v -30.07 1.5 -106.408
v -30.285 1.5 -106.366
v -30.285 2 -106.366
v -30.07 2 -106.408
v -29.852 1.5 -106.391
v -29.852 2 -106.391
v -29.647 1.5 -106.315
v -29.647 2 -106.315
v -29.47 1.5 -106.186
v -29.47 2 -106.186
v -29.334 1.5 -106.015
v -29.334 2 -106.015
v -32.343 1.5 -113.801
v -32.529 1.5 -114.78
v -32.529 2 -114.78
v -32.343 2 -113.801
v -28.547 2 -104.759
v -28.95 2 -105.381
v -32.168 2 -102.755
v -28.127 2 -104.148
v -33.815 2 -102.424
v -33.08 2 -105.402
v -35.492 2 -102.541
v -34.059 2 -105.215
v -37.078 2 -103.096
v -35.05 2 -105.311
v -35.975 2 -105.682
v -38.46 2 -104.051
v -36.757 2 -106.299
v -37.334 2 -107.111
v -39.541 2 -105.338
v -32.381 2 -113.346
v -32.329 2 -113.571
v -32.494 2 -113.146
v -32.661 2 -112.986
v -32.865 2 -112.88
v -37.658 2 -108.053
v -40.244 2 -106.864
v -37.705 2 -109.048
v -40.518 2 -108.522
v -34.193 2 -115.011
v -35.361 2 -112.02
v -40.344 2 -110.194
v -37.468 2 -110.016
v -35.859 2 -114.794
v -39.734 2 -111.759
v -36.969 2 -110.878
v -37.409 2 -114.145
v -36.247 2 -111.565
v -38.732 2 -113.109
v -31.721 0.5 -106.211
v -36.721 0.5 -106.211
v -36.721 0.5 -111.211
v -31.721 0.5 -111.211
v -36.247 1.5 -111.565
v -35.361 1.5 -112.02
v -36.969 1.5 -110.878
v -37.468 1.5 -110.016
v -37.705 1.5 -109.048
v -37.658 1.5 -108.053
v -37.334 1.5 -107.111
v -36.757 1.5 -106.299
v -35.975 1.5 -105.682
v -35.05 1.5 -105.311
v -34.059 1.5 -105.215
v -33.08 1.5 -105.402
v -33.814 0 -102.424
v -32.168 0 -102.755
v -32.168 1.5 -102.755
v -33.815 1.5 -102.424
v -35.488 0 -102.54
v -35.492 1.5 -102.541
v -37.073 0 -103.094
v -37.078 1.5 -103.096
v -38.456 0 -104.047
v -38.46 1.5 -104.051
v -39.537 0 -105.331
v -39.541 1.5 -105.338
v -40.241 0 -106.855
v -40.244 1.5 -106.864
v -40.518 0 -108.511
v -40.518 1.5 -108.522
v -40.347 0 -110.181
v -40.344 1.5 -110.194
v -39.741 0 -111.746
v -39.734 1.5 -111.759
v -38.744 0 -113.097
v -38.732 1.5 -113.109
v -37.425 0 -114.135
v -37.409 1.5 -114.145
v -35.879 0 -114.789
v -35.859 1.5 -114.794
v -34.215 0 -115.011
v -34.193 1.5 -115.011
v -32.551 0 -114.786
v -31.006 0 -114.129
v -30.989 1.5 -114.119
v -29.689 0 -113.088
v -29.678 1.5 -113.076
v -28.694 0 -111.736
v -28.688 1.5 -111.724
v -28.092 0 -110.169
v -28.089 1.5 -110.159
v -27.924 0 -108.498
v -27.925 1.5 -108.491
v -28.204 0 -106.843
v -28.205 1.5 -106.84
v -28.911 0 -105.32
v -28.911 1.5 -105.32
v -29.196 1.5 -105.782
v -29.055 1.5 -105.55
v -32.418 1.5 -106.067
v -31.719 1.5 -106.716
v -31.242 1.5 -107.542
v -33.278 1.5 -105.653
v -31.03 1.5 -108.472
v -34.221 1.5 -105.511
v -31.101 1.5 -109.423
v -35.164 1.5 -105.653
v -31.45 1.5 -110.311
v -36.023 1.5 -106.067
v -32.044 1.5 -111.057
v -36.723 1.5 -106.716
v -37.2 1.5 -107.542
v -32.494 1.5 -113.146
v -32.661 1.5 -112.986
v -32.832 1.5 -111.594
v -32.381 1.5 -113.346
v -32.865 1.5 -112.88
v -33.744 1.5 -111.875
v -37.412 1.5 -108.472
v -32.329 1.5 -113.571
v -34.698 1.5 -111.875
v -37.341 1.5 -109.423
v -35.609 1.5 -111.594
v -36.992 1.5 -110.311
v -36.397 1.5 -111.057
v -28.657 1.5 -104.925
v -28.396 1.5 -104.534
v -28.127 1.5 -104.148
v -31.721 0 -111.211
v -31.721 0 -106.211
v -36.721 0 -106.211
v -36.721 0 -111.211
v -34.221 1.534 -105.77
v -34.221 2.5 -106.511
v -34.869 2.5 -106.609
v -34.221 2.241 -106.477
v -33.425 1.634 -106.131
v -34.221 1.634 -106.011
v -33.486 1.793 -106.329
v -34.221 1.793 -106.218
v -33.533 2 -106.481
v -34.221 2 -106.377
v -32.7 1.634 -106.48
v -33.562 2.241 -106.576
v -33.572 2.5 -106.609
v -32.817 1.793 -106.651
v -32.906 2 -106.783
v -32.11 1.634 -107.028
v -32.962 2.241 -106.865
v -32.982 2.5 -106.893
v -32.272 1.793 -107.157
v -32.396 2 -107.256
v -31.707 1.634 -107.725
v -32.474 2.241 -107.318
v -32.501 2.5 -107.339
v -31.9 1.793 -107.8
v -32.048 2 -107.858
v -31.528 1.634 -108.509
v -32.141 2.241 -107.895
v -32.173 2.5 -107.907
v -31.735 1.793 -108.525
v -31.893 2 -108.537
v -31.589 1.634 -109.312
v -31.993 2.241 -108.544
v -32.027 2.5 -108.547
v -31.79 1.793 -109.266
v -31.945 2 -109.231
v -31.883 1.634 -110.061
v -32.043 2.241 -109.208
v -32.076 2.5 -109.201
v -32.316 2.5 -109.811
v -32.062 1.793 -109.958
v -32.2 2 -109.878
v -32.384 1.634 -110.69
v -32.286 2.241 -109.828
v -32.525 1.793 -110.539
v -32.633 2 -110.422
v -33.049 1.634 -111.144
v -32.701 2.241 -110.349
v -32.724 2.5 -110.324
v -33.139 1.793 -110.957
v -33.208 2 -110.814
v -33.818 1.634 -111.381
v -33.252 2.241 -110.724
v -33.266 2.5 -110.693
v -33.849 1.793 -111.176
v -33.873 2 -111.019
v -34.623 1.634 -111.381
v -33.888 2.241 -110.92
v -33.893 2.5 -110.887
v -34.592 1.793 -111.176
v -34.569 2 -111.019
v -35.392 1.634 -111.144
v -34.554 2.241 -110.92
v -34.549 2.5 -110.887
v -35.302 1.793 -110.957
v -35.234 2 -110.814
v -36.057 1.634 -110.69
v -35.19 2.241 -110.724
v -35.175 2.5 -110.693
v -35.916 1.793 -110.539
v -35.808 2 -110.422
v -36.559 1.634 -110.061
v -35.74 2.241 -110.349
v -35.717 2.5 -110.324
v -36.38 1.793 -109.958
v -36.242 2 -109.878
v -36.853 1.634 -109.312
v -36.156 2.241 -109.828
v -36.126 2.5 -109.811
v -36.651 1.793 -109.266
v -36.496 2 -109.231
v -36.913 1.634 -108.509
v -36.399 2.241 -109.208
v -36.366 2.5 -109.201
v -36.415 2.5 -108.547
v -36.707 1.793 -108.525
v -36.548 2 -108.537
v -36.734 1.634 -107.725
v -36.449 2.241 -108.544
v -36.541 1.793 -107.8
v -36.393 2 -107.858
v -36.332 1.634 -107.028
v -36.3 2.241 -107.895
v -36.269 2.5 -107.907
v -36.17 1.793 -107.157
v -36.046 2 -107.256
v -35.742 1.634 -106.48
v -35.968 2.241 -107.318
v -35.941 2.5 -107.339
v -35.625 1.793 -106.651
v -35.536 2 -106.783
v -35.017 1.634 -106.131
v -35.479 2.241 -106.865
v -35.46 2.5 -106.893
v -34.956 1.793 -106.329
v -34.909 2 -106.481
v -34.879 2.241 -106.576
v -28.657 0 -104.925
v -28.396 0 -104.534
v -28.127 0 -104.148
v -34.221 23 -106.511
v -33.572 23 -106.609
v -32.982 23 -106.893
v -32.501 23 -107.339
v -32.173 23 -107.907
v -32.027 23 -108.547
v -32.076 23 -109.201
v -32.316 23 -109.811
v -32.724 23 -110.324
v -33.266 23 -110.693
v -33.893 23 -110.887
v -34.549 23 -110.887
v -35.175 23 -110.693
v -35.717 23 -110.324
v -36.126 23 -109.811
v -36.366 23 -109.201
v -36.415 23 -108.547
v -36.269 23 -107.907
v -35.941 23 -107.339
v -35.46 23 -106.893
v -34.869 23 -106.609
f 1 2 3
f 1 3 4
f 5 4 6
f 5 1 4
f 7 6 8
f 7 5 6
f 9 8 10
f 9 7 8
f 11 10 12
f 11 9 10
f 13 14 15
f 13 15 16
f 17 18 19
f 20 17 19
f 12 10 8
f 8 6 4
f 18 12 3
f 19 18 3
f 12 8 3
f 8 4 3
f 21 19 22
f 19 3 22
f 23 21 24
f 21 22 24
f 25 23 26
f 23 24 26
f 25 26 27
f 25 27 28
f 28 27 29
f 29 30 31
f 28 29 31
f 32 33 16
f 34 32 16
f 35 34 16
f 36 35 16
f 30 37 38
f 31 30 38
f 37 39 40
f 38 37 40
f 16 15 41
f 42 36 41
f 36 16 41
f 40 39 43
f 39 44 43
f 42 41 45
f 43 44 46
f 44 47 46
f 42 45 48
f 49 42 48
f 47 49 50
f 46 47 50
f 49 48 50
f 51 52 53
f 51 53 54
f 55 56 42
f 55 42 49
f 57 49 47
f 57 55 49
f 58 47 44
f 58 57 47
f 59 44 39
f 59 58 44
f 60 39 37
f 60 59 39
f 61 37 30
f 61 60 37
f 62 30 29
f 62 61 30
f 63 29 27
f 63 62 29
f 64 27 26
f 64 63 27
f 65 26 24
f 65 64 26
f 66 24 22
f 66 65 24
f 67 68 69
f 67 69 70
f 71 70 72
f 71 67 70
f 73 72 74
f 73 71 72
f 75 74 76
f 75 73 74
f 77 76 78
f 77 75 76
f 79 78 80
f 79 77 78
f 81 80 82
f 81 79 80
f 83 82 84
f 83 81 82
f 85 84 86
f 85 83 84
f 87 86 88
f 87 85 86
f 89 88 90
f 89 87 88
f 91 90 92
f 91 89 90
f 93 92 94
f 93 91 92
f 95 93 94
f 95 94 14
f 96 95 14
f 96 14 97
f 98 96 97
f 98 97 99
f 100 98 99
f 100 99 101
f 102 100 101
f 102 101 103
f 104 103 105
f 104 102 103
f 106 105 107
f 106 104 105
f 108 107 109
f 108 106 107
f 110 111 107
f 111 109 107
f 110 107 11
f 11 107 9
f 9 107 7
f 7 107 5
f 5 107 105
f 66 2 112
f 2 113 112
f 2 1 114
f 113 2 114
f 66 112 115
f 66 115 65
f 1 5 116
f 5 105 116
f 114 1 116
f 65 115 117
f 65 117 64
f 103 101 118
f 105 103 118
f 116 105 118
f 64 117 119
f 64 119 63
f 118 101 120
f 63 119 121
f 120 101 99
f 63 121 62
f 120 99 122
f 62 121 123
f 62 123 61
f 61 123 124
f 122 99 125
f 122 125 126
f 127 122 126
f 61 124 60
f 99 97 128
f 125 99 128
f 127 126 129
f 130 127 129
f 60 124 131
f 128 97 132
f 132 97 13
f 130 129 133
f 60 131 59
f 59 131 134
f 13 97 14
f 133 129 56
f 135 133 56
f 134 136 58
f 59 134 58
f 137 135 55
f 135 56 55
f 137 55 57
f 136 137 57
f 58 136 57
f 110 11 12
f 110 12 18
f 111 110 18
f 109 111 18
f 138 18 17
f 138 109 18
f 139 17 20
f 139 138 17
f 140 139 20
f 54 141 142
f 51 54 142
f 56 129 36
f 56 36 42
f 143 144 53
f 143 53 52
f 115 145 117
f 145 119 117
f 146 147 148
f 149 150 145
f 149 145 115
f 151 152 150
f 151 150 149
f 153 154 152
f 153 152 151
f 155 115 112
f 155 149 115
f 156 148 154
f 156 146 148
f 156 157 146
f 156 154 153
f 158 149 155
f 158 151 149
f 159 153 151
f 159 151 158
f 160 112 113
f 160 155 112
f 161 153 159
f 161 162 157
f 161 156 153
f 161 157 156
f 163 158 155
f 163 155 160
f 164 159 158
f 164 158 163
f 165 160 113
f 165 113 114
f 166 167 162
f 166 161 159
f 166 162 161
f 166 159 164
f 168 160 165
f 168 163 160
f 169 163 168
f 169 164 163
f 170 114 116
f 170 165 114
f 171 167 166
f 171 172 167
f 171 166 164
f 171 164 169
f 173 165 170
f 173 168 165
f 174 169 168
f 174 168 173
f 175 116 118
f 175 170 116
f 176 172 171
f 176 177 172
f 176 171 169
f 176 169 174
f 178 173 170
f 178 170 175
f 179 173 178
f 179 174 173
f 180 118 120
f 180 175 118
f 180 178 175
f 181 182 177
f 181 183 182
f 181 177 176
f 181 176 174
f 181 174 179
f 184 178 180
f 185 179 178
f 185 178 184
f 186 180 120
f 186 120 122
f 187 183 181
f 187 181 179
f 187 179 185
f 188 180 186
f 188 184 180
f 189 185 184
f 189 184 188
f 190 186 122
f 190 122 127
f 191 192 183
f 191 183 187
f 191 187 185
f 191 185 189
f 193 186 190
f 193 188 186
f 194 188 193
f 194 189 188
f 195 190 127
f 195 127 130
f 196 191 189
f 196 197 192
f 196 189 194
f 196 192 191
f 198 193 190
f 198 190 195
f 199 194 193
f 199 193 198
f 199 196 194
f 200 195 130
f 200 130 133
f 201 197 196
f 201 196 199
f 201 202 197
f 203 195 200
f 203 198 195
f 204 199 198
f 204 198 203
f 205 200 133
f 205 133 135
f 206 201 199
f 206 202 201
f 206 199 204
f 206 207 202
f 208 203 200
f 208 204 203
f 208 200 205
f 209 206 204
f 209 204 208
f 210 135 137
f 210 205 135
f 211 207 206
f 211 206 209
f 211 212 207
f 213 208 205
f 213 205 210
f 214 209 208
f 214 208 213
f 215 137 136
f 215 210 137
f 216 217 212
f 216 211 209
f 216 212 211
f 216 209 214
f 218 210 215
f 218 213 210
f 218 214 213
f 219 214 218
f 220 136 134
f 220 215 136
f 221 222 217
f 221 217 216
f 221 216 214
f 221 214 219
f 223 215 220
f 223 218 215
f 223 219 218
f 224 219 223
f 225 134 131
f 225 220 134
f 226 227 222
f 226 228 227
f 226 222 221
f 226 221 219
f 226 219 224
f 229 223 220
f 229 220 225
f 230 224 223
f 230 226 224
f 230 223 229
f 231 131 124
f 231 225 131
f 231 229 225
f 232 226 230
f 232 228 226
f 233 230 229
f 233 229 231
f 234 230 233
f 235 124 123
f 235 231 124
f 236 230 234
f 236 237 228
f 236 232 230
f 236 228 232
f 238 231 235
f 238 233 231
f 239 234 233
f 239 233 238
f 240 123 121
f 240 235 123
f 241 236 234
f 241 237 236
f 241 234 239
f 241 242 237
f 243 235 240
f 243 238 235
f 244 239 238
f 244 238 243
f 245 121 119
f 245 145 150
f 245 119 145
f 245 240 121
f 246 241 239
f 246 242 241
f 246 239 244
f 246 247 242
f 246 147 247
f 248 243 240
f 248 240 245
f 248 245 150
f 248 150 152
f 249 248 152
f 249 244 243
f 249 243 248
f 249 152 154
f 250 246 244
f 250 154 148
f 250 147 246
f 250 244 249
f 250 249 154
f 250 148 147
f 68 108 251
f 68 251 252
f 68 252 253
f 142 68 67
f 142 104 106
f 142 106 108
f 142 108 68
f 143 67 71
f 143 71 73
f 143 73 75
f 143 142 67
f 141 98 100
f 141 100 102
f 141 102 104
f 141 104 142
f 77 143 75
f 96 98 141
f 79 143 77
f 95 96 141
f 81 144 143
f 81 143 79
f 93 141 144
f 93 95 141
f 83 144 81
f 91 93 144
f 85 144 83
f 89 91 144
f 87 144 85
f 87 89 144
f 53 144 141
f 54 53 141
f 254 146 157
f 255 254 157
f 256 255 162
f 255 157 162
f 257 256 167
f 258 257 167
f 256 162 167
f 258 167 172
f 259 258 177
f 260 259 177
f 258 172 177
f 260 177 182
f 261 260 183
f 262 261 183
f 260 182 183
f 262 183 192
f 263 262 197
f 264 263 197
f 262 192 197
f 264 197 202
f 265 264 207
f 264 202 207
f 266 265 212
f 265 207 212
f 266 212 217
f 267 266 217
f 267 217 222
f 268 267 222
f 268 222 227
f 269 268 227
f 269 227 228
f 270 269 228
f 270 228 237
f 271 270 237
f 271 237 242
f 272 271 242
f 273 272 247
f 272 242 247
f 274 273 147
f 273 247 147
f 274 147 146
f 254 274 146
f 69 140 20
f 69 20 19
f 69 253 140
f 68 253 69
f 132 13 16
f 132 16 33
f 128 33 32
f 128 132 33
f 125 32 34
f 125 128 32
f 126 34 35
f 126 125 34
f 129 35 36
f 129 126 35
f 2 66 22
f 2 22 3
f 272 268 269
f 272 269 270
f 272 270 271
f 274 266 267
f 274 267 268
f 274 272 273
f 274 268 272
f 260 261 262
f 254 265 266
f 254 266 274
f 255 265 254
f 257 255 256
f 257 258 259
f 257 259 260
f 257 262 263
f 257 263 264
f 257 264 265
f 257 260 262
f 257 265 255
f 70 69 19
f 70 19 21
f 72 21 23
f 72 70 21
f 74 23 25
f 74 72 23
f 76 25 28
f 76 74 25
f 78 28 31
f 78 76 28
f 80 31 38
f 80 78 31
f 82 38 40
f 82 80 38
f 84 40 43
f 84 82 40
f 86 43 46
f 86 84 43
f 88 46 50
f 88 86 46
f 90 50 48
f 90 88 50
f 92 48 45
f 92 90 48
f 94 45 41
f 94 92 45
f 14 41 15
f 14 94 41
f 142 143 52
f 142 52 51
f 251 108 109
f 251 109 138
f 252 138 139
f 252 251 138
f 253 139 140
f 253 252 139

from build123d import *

# Parameters (mm, degrees)
SALIENTE_EXTRUIR1_DEPTH = 1.5
SKETCH1_R               = 2.2
BOSS_EXTRUDE1_DEPTH     = 21.500000004
FILLET1_R               = 1
BOSS_EXTRUDE2_DEPTH     = 0.5
SKETCH3_W               = 5
SKETCH3_H               = 5
CUT_EXTRUDE1_DEPTH      = 0.5


with BuildPart() as part:
    # Croquis1 → Saliente-Extruir1 (new body)
    with BuildSketch(Plane(origin=(0, 0, 0), x_dir=(1, 0, 0), z_dir=(0, 1, 0))):
        with BuildLine():
            Line((-28.127006156, 104.147953484), (-32.167734628, 102.755086599))
            ThreePointArc((-32.167734628, 102.755086599), (-38.119150085, 113.660211034), (-28.911320585, 105.320129452))
            ThreePointArc((-28.911320585, 105.320129452), (-28.527159067, 104.728691469), (-28.127006156, 104.147953484))
        make_face()
    extrude(amount=SALIENTE_EXTRUIR1_DEPTH)

    # Sketch1 → Boss-Extrude1 (add)
    with BuildSketch(Plane(origin=(0, 1.5, 0), x_dir=(1, 0, 0), z_dir=(0, 1, 0))):
        with Locations(Location((-34.220833362, 108.71115792, 0), (0, 0, 270))):
            Circle(SKETCH1_R)
    extrude(amount=BOSS_EXTRUDE1_DEPTH)

    # Fillet1
    fillet1_edges = [part.edges().sort_by_distance(p)[0] for p in [
        (-34.220833362, 1.5, -110.91115792),
    ]]
    fillet(fillet1_edges, radius=FILLET1_R)

    # Sketch2 → Boss-Extrude2 (add)
    with BuildSketch(Plane(origin=(0, 1.5, 0), x_dir=(1, 0, 0), z_dir=(0, 1, 0))):
        with BuildLine():
            Line((-28.127006156, 104.147953484), (-32.167734628, 102.755086599))
            ThreePointArc((-32.167734628, 102.755086599), (-40.517997562, 108.522152547), (-32.528643989, 114.779641679))
            Line((-32.528643989, 114.779641679), (-32.343112299, 113.800939457))
            ThreePointArc((-32.343112299, 113.800939457), (-32.430302685, 113.242017247), (-32.865386144, 112.880494657))
            Line((-32.865386144, 112.880494657), (-35.36144377, 112.020086432))
            ThreePointArc((-35.36144377, 112.020086432), (-37.529761874, 107.570547512), (-33.080222954, 105.402229408))
            Line((-33.080222954, 105.402229408), (-30.284555445, 106.36591522))
            ThreePointArc((-30.284555445, 106.36591522), (-29.746563901, 106.359998905), (-29.333985462, 106.014674515))
            ThreePointArc((-29.333985462, 106.014674515), (-28.750570862, 105.068333927), (-28.127006156, 104.147953484))
        make_face()
    extrude(amount=BOSS_EXTRUDE2_DEPTH)

    # Sketch3 → Cut-Extrude1 (cut)
    with BuildSketch(Plane.XZ):
        with Locations((-34.220833362, -108.71115792)):
            Rectangle(SKETCH3_W, SKETCH3_H)
    extrude(amount=-CUT_EXTRUDE1_DEPTH, mode=Mode.SUBTRACT)


solid = part.part
